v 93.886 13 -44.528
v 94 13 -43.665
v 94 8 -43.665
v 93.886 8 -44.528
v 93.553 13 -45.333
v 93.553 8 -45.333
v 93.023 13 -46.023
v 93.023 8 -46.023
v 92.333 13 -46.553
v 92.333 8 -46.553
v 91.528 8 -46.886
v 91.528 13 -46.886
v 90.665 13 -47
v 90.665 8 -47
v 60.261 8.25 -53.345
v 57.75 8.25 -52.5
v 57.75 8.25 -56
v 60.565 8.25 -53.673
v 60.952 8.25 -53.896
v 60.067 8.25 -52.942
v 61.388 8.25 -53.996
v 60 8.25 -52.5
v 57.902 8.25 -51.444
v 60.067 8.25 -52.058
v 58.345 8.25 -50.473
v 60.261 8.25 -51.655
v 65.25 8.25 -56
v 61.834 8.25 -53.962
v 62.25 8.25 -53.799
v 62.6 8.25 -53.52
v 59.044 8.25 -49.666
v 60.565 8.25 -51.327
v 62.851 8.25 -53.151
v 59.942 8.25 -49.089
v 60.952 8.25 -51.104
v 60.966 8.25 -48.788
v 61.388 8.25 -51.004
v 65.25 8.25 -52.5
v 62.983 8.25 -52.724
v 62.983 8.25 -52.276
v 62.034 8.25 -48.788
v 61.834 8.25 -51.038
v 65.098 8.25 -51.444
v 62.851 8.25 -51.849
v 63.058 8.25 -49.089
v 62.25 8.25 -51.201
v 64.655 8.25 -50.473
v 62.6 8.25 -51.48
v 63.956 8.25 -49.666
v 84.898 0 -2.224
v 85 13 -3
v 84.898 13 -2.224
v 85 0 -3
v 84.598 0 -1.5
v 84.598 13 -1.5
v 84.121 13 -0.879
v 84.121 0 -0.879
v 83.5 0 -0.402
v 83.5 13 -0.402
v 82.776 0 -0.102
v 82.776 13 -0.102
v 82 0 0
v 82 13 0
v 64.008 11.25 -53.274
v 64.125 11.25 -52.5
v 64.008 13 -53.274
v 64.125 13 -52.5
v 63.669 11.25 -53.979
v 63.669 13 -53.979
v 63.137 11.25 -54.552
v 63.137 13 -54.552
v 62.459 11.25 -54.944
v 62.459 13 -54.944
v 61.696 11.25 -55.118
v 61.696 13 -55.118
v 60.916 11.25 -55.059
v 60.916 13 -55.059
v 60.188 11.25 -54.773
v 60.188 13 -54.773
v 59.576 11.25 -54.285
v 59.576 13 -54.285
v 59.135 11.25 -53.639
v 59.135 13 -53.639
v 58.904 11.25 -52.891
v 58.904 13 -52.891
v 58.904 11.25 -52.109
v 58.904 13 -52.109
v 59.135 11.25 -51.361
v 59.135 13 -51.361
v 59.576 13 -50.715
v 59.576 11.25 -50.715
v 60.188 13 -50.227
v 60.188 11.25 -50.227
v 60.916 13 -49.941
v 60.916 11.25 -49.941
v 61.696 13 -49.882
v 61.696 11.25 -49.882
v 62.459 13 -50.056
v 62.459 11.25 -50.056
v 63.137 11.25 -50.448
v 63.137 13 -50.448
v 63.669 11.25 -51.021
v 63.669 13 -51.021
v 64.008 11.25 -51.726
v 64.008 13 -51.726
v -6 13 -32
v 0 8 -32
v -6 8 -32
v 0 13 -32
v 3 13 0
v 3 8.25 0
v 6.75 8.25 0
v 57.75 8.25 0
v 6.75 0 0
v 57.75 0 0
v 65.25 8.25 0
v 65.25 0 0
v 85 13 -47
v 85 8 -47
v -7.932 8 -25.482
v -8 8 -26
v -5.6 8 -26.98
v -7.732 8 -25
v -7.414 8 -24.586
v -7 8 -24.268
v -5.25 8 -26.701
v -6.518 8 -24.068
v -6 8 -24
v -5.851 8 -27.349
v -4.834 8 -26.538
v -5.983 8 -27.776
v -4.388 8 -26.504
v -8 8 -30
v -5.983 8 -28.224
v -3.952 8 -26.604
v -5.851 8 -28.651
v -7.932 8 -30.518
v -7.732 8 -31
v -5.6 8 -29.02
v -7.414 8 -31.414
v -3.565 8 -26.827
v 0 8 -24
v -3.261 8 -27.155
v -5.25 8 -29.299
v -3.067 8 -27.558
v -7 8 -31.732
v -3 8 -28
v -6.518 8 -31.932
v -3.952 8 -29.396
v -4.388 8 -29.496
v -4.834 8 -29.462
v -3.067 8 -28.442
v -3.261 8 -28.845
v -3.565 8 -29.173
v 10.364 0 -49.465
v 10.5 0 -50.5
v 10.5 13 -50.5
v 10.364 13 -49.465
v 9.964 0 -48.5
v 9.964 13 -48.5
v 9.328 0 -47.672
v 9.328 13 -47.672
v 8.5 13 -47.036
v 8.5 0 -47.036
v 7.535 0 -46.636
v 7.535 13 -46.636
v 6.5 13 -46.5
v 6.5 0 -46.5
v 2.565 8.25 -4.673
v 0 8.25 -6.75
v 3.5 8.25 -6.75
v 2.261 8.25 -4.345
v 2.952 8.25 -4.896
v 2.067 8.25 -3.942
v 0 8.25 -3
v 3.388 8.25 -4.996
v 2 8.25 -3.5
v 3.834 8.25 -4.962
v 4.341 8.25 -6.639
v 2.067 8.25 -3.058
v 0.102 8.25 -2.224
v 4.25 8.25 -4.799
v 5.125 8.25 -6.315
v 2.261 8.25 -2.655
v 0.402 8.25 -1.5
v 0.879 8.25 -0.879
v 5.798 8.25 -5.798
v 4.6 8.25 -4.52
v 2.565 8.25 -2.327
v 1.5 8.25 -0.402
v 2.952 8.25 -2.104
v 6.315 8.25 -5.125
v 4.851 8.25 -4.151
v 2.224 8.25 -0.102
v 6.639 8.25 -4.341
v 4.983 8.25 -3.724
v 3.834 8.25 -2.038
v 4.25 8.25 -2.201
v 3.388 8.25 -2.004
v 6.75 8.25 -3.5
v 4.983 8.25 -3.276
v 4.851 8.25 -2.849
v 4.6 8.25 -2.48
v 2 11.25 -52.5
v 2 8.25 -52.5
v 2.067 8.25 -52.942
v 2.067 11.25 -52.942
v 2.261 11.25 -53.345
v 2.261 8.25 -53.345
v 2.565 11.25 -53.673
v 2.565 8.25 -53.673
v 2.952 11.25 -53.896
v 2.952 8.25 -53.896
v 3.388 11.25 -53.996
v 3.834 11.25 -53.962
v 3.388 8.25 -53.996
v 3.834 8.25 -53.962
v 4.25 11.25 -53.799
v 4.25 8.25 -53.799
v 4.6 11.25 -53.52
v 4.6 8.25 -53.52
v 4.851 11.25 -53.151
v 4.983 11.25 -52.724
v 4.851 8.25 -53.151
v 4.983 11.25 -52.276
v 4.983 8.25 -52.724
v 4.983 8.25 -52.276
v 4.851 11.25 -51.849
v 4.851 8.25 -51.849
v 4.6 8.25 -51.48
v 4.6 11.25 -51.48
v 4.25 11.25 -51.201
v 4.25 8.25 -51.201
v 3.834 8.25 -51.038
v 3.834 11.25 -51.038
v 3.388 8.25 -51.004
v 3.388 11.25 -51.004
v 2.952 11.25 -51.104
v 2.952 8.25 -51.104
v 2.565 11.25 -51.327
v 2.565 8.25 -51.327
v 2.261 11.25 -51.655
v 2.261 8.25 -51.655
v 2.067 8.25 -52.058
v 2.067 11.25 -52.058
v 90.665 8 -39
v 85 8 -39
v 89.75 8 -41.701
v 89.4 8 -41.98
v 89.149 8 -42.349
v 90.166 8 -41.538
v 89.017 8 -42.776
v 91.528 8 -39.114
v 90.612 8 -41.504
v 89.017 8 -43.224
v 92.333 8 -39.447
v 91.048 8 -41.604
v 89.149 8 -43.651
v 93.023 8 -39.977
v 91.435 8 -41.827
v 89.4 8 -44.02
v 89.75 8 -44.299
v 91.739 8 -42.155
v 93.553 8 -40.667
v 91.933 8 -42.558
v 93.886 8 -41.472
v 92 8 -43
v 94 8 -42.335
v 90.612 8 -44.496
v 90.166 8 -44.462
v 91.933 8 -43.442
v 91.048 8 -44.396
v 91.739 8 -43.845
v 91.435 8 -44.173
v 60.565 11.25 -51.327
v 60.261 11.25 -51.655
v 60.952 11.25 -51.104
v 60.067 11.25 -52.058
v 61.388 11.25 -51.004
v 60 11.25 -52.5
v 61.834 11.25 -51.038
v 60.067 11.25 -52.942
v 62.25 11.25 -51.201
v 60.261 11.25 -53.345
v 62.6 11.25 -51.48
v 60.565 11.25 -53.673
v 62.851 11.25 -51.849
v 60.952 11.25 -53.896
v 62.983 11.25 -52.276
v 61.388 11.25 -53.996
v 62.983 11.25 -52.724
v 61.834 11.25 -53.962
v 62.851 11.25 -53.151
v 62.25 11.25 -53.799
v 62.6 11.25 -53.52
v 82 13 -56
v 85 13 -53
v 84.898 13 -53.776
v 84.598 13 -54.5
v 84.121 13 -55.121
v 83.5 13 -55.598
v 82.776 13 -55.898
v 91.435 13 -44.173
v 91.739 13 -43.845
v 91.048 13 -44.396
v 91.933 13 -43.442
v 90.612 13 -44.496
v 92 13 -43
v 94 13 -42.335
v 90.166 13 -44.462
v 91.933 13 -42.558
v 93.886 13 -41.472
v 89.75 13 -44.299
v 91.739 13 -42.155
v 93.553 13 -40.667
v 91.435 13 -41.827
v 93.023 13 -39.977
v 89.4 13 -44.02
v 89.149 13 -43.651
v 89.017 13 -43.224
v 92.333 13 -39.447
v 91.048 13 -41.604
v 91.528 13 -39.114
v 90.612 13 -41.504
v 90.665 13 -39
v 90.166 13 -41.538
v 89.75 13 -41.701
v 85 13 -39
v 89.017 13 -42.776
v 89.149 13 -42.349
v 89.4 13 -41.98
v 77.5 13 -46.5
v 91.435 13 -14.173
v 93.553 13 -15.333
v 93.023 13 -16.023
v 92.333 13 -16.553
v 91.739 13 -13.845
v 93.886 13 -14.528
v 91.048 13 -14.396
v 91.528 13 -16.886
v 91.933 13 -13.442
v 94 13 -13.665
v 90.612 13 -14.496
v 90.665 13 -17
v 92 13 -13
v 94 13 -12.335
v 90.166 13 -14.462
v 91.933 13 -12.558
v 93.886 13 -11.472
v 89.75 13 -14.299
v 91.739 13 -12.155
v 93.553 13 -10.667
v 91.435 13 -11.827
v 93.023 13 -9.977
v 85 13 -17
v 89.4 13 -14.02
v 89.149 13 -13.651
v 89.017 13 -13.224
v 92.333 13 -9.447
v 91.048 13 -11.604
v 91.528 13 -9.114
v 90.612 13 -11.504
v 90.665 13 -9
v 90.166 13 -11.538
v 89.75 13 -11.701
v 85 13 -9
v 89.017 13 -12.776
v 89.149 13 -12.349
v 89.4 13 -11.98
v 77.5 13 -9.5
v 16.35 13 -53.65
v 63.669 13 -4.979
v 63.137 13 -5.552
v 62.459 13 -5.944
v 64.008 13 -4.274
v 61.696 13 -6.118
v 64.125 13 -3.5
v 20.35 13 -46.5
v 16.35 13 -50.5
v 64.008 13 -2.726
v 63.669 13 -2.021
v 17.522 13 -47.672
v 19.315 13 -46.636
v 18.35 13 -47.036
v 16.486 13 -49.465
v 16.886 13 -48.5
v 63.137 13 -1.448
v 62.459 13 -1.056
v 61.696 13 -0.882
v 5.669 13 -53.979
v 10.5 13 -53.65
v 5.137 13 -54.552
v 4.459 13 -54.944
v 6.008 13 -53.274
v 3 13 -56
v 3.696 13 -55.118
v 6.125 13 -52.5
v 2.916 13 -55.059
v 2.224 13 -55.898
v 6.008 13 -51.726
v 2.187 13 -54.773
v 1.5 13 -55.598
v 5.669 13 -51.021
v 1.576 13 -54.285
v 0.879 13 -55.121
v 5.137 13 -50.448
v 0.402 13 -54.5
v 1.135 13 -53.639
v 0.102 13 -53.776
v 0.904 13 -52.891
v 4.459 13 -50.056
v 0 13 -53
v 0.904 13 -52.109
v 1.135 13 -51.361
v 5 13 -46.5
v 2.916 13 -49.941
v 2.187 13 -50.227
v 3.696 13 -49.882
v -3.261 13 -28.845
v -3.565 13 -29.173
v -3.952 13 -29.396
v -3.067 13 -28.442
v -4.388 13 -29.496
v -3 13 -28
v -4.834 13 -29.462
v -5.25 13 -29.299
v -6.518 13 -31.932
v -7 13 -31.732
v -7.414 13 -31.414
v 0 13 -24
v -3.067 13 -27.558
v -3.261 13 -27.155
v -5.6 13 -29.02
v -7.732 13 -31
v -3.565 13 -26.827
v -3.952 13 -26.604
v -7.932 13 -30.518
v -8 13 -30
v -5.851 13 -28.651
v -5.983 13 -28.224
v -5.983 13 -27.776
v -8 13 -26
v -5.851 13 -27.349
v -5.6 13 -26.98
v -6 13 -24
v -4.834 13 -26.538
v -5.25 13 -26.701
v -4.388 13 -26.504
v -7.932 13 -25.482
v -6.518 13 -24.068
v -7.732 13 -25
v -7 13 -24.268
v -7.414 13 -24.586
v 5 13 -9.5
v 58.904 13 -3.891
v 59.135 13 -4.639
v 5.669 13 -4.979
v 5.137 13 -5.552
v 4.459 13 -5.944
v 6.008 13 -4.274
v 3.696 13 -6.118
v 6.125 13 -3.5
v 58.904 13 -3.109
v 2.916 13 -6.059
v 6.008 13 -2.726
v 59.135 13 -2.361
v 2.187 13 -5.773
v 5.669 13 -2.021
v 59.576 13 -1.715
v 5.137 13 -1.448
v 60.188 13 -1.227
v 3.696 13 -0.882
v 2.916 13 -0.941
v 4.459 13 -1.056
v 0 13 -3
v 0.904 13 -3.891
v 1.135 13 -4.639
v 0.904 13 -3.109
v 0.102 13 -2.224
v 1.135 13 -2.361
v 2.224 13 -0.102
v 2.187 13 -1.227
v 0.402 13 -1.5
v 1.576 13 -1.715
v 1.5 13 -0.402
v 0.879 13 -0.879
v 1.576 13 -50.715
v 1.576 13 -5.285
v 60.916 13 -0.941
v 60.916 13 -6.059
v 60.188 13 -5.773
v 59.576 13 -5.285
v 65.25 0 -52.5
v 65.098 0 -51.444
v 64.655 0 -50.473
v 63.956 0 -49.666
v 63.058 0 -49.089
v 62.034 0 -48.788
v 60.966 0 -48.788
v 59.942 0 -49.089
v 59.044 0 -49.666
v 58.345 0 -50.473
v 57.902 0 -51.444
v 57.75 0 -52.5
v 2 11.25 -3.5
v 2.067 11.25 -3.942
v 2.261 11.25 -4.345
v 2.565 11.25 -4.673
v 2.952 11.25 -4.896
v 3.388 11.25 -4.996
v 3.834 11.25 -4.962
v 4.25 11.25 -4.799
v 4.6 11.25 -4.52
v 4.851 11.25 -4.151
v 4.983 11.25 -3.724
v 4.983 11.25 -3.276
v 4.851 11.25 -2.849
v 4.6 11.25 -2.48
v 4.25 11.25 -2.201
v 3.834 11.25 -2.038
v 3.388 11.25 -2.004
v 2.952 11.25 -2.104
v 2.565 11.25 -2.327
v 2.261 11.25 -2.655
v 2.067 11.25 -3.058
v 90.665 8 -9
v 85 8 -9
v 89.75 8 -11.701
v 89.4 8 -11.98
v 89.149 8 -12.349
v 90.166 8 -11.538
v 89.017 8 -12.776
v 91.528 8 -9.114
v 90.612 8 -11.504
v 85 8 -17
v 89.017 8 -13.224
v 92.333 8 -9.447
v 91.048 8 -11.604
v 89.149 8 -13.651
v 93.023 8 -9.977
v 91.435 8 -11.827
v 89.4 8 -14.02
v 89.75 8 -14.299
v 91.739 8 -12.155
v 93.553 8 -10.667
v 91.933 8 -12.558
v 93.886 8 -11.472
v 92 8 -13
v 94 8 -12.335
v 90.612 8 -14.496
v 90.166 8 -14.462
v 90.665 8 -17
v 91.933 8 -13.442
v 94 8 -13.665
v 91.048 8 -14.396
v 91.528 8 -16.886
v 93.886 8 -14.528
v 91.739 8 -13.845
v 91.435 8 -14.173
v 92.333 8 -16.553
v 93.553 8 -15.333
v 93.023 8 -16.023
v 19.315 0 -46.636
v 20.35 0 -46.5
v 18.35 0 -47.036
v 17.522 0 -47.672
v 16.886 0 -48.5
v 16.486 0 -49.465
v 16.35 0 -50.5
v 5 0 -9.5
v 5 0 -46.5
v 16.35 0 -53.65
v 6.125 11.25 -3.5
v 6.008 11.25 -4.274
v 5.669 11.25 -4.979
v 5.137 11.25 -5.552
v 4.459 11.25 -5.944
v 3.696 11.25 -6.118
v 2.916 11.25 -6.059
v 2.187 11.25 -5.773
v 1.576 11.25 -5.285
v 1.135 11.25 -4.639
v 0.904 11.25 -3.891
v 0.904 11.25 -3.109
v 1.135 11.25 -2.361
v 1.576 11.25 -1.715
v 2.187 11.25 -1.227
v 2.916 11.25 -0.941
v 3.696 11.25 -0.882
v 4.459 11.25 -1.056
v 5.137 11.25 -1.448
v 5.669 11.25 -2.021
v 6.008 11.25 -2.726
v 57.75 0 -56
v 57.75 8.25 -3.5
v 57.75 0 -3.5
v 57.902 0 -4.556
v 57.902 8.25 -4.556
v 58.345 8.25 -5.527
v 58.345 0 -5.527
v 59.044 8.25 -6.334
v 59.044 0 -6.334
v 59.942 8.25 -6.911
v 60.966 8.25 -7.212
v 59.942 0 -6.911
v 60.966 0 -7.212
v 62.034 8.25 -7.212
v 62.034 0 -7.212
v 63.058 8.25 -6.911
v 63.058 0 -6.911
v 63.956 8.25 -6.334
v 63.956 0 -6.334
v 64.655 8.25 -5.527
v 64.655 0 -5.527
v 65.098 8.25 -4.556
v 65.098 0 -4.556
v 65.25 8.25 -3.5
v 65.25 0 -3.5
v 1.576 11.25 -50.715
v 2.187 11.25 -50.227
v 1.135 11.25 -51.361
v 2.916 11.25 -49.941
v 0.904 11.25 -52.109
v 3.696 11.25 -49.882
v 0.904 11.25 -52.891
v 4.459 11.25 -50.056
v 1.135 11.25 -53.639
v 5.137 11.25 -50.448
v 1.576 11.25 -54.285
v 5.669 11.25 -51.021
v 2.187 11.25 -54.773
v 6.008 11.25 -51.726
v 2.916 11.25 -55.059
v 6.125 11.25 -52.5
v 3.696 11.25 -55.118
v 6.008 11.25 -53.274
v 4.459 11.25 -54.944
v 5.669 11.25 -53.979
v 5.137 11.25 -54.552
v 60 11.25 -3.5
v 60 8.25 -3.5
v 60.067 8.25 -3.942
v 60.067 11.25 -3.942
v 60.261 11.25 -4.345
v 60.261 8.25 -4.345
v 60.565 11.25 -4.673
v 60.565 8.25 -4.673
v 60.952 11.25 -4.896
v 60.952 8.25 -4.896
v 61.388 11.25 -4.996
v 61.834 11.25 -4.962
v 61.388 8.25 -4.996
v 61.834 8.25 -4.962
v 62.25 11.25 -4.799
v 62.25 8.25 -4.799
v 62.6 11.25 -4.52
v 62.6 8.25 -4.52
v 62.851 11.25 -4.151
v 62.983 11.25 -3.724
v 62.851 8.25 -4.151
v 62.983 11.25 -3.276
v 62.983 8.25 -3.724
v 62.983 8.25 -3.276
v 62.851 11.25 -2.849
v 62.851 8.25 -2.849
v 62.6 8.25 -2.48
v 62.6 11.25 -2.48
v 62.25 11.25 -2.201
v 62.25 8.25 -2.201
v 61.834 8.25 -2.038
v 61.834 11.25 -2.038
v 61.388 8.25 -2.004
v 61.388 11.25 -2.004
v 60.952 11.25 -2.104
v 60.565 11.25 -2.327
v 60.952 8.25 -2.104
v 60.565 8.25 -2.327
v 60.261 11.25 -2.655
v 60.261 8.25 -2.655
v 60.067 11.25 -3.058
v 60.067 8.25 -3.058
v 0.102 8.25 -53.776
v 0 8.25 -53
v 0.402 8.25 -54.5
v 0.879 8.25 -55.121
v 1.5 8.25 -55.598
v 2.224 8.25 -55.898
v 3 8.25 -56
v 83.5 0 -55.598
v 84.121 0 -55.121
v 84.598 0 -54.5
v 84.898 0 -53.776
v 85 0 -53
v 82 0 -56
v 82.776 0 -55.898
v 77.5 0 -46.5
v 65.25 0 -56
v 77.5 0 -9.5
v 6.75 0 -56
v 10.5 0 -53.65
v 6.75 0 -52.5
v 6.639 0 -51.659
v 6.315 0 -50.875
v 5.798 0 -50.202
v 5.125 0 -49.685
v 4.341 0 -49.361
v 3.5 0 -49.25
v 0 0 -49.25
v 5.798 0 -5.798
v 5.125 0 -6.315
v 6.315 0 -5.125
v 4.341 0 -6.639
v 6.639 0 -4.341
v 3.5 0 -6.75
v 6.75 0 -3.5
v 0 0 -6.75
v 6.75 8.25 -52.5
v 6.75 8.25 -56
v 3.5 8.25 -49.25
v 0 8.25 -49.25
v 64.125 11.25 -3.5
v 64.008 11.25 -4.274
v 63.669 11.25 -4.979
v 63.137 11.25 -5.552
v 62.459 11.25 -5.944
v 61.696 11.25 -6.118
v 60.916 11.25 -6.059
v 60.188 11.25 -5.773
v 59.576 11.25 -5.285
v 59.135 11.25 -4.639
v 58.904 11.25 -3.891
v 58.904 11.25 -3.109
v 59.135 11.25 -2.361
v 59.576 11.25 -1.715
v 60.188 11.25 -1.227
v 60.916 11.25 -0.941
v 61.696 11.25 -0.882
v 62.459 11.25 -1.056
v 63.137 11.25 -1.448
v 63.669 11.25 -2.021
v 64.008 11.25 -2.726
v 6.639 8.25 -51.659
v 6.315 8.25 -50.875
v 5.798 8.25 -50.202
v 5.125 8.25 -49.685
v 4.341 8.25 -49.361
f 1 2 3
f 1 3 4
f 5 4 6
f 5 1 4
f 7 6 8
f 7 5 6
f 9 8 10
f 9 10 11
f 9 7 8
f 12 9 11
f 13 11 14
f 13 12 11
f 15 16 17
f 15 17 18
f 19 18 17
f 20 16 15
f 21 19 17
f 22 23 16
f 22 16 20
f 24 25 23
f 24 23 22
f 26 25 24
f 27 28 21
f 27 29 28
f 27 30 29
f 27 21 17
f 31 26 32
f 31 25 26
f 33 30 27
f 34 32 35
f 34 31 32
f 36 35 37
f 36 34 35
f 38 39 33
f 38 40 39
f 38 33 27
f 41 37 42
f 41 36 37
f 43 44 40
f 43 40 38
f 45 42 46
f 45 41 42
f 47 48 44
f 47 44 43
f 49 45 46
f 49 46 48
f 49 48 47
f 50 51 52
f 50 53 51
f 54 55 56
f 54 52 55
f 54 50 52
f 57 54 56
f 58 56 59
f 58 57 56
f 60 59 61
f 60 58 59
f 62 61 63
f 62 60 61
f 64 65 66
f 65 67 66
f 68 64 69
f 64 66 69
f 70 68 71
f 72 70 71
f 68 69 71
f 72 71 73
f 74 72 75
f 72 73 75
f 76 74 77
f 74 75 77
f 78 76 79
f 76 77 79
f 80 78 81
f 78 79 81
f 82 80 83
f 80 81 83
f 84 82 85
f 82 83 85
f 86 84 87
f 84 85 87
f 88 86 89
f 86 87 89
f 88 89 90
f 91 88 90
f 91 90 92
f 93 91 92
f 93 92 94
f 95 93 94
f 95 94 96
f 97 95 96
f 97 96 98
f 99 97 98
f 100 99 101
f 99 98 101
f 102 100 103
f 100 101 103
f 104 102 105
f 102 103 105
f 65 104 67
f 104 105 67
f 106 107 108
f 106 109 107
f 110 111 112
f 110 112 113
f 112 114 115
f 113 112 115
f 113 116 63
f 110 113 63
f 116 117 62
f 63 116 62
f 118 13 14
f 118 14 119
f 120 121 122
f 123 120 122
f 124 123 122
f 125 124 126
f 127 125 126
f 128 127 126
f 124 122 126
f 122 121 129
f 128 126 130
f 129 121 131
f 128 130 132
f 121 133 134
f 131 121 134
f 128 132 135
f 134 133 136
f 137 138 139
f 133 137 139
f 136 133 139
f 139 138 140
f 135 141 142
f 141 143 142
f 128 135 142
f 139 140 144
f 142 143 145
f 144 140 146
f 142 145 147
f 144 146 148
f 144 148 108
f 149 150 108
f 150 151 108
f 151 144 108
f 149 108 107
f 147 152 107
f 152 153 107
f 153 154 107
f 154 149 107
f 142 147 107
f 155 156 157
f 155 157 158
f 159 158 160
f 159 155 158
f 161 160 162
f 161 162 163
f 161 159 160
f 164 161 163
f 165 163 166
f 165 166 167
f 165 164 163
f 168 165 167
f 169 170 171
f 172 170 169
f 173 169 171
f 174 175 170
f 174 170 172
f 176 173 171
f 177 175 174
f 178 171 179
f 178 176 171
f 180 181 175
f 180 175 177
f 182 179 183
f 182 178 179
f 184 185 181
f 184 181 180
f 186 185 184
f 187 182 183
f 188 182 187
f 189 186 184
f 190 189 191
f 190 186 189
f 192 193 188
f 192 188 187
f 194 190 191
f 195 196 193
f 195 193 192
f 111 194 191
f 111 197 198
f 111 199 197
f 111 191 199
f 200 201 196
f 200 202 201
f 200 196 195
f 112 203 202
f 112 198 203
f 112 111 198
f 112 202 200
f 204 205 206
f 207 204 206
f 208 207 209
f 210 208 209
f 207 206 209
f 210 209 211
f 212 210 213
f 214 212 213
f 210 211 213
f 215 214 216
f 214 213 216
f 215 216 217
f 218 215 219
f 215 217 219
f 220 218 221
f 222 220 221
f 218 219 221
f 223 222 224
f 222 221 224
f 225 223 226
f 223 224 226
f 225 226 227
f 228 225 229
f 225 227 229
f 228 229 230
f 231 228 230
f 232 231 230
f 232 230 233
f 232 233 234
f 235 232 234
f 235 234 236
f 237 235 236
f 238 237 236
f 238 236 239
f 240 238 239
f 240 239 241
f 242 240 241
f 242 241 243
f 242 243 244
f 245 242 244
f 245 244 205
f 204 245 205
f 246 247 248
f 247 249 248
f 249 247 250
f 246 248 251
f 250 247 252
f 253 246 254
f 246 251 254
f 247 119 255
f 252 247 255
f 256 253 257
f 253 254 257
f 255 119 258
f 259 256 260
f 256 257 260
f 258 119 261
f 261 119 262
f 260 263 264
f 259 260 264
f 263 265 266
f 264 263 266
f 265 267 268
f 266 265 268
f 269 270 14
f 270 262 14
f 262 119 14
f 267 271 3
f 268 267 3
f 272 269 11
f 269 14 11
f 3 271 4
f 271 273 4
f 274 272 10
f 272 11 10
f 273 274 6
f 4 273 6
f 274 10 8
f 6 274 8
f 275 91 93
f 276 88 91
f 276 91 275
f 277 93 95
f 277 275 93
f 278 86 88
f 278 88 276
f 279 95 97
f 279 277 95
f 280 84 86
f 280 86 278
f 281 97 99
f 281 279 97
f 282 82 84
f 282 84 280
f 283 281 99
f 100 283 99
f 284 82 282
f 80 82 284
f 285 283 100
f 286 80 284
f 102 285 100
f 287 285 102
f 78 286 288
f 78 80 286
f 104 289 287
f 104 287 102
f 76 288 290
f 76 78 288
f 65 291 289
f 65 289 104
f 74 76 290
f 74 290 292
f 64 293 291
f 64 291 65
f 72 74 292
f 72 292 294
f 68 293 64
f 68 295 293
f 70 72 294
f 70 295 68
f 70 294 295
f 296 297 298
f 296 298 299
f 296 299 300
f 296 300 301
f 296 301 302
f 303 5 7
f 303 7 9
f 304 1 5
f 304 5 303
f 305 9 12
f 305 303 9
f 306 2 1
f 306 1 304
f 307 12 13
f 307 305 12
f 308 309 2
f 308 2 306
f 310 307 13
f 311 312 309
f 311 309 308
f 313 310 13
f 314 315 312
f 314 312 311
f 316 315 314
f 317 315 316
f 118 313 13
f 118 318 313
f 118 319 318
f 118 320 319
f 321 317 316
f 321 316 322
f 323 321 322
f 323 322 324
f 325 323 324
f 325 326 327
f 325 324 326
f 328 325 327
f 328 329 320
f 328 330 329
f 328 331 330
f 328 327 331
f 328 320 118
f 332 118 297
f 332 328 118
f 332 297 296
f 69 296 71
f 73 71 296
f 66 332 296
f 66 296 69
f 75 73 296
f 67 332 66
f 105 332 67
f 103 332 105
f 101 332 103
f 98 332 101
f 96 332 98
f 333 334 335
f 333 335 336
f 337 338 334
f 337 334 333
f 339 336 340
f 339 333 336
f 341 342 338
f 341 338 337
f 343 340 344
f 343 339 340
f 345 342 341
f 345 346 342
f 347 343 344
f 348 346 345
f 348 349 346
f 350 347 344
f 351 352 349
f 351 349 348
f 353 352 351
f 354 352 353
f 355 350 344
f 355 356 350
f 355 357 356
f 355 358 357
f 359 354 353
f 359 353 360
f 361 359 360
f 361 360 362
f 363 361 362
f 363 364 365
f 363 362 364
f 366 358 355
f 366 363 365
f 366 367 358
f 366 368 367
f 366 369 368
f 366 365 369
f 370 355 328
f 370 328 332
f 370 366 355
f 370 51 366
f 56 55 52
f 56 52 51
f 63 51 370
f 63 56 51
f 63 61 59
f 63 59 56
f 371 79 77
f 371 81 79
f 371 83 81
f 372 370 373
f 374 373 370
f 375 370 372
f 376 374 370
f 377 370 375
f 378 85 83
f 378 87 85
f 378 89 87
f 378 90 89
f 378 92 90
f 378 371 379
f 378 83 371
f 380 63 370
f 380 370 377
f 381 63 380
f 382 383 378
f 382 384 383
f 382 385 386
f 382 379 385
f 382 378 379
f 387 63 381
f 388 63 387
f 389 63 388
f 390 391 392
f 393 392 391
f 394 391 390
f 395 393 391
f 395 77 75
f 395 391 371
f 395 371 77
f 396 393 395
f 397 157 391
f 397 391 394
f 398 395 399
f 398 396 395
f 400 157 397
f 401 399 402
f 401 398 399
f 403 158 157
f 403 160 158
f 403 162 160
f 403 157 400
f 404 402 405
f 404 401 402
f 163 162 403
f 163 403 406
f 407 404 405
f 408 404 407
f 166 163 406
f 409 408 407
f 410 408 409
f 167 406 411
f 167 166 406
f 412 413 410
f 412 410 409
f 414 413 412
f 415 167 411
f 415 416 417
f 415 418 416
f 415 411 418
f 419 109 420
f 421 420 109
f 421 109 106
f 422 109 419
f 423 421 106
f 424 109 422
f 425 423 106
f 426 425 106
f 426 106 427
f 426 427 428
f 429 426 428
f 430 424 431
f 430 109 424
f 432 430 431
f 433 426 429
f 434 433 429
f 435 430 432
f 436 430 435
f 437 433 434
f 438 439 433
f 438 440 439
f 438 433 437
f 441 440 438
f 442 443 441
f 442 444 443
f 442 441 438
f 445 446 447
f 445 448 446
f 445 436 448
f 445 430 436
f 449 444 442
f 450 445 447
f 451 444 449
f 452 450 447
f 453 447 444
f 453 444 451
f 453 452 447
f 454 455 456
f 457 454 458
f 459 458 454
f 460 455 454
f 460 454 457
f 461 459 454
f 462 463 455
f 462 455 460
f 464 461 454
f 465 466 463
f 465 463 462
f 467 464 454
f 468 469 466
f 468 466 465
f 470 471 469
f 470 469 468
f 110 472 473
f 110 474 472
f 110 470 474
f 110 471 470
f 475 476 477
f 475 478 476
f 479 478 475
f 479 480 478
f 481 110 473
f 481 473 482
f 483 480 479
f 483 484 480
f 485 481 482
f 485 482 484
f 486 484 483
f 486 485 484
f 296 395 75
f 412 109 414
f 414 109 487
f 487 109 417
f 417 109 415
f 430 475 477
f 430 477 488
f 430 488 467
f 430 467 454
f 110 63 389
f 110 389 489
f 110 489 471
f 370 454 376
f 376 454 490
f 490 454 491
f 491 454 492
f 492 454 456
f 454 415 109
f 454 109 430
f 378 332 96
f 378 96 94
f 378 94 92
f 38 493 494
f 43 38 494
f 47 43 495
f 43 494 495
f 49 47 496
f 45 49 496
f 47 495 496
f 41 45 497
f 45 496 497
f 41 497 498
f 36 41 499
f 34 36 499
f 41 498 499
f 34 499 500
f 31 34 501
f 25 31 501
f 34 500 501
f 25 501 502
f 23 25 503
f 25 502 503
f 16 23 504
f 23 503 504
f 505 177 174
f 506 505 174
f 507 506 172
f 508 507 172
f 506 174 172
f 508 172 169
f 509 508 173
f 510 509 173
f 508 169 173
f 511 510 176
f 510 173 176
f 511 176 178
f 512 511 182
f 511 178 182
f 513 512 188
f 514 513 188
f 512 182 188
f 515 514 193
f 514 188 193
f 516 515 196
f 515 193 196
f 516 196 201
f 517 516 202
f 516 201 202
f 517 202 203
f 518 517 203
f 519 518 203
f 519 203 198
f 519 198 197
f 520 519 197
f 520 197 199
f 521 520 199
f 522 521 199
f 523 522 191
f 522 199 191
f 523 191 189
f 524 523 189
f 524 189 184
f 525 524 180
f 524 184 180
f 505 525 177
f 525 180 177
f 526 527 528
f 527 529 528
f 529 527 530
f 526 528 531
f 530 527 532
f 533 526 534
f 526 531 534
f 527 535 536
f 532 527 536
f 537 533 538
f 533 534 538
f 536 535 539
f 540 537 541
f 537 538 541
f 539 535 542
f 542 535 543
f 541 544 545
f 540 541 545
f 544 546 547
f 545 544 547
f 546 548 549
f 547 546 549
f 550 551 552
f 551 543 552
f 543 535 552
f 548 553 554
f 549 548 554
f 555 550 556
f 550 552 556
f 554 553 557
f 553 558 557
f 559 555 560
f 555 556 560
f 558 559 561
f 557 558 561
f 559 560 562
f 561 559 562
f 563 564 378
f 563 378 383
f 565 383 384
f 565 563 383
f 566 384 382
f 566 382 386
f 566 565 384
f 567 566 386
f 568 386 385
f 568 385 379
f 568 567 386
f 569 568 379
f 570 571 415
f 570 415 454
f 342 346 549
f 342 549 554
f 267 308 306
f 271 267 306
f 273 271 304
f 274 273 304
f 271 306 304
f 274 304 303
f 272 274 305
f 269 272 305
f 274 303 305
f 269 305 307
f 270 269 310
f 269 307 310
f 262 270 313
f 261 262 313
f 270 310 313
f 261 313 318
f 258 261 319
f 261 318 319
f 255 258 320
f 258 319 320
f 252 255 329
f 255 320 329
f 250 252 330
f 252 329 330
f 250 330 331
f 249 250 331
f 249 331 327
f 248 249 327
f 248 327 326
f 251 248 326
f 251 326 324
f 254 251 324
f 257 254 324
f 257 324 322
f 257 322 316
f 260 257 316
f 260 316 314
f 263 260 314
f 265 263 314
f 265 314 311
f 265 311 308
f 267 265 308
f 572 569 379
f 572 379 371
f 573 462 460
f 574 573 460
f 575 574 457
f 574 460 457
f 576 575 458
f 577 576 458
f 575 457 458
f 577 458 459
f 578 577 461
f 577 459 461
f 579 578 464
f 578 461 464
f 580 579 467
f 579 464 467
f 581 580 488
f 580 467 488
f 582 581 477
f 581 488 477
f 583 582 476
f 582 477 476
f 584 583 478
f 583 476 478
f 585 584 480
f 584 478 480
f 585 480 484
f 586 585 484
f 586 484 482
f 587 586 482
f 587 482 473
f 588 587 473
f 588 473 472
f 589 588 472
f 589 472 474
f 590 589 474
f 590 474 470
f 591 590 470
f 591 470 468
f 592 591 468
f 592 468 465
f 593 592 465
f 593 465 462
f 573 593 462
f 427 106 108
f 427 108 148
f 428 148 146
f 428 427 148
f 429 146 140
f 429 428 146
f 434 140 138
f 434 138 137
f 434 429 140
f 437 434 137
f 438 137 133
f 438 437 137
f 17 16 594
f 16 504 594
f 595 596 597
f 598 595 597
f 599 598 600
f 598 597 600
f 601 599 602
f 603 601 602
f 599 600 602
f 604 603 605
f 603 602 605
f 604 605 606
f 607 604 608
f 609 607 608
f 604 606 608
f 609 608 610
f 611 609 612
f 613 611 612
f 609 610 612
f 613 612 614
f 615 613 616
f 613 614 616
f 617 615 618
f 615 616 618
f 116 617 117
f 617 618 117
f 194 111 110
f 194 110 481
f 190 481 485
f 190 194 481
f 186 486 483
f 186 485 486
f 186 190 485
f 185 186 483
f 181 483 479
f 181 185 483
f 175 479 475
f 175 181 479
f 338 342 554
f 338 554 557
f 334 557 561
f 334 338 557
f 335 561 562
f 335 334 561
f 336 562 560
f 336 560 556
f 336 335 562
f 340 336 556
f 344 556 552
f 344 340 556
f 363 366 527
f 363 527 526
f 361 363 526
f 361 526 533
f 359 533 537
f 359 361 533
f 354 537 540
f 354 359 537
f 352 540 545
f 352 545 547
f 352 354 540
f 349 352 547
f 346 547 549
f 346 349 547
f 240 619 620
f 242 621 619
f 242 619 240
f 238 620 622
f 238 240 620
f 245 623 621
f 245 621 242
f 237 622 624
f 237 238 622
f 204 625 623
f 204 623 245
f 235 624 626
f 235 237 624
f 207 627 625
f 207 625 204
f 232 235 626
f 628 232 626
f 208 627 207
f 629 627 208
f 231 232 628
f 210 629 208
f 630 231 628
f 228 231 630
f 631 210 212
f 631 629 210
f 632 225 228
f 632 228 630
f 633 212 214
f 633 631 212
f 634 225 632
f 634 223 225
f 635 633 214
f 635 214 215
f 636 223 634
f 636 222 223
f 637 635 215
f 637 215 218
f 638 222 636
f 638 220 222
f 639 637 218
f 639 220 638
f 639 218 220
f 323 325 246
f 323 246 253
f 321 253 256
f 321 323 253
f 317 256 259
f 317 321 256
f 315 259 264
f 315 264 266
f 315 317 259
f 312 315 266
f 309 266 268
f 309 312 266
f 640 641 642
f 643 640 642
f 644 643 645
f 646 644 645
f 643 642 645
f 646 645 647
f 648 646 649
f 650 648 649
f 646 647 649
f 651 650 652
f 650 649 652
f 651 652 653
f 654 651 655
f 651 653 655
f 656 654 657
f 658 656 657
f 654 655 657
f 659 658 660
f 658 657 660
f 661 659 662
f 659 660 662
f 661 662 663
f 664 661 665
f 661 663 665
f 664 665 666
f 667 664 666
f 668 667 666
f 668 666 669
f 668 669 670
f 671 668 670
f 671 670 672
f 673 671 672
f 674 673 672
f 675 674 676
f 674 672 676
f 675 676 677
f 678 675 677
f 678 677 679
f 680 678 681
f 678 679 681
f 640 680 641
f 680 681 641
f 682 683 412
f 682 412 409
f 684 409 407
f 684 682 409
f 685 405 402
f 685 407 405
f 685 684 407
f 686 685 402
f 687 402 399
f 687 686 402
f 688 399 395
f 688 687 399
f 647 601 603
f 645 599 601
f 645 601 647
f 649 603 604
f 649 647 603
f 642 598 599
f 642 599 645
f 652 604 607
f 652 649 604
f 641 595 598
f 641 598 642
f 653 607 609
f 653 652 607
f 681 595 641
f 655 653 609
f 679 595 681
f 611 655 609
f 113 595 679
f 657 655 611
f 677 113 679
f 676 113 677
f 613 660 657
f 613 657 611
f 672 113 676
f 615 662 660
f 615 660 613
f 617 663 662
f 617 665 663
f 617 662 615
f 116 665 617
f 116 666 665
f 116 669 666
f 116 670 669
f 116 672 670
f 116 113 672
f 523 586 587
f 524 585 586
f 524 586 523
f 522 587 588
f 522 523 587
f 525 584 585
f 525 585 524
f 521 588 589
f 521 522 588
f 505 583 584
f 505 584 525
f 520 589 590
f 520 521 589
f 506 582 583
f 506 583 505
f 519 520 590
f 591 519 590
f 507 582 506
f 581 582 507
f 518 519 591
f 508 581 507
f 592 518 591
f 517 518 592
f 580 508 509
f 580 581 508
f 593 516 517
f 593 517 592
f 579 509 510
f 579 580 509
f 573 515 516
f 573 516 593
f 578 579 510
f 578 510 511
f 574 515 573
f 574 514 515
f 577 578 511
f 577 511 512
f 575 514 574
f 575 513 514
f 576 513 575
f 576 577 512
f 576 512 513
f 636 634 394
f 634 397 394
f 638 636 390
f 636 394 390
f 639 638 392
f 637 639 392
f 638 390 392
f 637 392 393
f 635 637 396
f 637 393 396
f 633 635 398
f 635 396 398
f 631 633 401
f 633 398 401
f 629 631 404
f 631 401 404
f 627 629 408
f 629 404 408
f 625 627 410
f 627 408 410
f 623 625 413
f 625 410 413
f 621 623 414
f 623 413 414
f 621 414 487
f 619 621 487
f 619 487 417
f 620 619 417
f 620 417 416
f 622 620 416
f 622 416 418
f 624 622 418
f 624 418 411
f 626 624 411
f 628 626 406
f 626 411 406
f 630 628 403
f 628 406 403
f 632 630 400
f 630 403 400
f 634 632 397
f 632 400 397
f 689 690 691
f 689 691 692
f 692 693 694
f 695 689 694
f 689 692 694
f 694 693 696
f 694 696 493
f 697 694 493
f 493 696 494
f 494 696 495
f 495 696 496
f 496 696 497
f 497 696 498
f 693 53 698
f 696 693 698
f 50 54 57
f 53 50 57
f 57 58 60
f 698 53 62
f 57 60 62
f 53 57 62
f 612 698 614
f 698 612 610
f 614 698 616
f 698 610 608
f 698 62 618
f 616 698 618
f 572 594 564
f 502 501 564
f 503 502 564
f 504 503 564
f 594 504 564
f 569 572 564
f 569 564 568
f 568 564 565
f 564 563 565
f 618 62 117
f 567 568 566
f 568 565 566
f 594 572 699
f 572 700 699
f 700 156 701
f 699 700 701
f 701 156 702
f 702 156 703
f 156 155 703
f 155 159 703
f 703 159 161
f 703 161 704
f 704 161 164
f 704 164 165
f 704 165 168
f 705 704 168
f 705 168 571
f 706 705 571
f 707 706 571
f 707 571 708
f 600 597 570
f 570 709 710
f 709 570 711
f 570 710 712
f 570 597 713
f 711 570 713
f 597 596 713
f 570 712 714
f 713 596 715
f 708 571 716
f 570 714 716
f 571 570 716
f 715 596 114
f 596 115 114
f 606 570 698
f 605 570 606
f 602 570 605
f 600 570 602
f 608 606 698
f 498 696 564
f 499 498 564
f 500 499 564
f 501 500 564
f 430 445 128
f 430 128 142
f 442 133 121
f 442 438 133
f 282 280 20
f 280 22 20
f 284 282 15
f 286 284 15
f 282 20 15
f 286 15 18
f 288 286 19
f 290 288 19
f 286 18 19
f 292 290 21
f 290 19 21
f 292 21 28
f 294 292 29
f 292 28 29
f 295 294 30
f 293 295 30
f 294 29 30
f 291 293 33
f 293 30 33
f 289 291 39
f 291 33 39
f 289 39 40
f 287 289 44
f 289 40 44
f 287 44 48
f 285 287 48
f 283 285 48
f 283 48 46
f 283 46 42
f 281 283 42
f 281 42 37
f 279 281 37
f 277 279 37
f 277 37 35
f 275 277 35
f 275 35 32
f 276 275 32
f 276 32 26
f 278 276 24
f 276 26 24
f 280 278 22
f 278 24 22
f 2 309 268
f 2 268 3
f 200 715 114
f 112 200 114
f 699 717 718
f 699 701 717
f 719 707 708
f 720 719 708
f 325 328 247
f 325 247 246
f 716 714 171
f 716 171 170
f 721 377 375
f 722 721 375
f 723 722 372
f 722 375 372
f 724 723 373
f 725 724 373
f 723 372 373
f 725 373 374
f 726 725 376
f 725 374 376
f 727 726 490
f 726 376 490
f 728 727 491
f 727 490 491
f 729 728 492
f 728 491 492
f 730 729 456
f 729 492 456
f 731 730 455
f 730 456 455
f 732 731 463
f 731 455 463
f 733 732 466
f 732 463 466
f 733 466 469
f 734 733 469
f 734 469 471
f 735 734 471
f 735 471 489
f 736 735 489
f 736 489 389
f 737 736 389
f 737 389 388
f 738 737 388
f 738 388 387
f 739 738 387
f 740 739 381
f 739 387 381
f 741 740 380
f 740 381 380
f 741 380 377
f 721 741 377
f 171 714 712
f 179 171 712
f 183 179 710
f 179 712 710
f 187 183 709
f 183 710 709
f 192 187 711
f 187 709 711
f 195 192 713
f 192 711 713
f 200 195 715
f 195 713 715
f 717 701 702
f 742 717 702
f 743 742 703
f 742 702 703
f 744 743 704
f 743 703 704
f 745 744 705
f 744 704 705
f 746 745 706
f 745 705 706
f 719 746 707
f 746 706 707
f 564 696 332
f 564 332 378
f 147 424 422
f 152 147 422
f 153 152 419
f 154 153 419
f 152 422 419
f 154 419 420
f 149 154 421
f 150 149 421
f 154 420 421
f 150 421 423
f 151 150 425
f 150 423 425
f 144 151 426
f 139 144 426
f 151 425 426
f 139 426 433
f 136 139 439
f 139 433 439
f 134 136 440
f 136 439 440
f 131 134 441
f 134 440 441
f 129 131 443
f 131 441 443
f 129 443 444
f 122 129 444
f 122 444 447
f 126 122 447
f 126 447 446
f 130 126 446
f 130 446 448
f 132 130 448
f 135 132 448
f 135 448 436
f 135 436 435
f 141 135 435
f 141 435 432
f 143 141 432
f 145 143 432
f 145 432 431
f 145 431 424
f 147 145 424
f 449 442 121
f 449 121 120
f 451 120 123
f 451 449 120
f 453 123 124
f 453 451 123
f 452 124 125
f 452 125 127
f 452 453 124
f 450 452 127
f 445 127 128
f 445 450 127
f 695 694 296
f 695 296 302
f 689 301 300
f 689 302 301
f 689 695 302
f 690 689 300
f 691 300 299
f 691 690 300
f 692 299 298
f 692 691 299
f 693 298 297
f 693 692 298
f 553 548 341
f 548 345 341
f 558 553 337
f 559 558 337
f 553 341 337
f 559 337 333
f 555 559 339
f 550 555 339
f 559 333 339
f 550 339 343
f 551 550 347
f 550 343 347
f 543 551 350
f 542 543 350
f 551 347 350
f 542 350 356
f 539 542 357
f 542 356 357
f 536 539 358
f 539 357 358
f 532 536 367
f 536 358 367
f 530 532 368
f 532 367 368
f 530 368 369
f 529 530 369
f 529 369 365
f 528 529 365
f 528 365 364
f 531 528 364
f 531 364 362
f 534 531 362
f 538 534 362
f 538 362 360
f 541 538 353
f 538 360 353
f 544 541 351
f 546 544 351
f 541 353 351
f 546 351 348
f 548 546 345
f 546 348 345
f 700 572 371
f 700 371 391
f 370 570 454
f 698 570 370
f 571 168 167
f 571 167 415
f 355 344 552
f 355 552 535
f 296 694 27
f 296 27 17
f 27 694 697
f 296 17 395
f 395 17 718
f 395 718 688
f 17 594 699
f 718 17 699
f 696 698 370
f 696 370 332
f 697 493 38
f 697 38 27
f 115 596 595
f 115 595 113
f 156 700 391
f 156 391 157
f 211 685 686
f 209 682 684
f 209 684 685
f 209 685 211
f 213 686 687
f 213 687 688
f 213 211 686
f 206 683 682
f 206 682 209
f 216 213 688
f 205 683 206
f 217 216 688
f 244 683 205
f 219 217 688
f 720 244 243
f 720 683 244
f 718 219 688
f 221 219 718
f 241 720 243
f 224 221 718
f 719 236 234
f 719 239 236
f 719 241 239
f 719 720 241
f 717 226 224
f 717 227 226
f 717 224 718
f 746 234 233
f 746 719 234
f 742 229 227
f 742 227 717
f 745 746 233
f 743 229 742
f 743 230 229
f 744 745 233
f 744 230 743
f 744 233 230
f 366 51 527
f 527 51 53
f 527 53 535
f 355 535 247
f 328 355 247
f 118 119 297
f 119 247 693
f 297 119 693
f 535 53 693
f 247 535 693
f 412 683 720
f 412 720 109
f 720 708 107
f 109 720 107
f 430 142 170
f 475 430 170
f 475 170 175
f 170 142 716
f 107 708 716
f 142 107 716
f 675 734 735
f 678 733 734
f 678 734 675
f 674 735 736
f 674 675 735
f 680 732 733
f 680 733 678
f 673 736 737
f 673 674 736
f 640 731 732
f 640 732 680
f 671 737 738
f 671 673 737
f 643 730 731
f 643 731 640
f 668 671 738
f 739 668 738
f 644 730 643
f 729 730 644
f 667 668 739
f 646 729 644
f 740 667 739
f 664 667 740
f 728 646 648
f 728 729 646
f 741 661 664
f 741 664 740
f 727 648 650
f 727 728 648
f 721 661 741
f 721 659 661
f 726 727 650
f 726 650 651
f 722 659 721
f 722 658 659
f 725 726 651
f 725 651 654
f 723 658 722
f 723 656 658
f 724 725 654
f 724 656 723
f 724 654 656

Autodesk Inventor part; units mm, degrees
ref_plane "YZ Plane" through (0, 0, 0) normal (1, 0, 0) x (0, 1, 0)
ref_plane "XZ Plane" through (0, 0, 0) normal (0, 1, 0) x (-1, 0, 0)
ref_plane "XY Plane" through (0, 0, 0) normal (0, 0, 1) x (1, 0, 0)
sketch "Sketch1" plane through (0, 0, 0) normal (0, 1, 0) x (-1, 0, 0)
  line L0 (-3, 0) -> (-82, 0)
  line L1 (-85, -3) -> (-85, -53)
  line L2 (-82, -56) -> (-3, -56)
  line L3 (0, -53) -> (0, -3)
  arc A0 (-3, -56) -> (0, -53) centre (-3, -53) ccw
  arc A1 (0, -3) -> (-3, 0) centre (-3, -3) ccw
  arc A2 (-82, 0) -> (-85, -3) centre (-82, -3) ccw
  arc A3 (-85, -53) -> (-82, -56) centre (-82, -53) ccw
  circle A4 centre (-3.5, -52.5) radius 1.5
  circle A5 centre (-3.5, -3.5) radius 1.5
  circle A6 centre (-61.5, -52.5) radius 1.5
  circle A7 centre (-61.5, -3.5) radius 1.5
  point P0 (0, 0)
  point P1 (-85, -56)
  point P2 (-85, 0)
  point P3 (0, -56)
  dimension "d0" = 85
  dimension "d1" = 56
  dimension "d2" = 3
  dimension "d9" = 3
  dimension "d10" = 3
  dimension "d15" = 3
  dimension "d16" = 3
  dimension "d140" = 58
  dimension "d141" = 58
  dimension "d142" = 49
  dimension "d143" = 3.5
extrude "Extrusion1" add sketch "Sketch1" along normal blind 13
sketch "Sketch12" plane through (0, 0, 0) normal (0, -1, 0) x (1, 0, 0)
  line L0 (5, -9.5) -> (77.5, -9.5)
  line L1 (77.5, -9.5) -> (77.5, -46.5)
  line L2 (5, -46.5) -> (5, -9.5)
  line L3 (82, -56) -> (3, -56) projected
  line L4 (85, -3) -> (85, -53) projected
  line L5 (3, 0) -> (82, 0) projected
  line L6 (0, -53) -> (0, -3) projected
  line L7 (16.35, -50.5) -> (16.35, -53.65)
  line L8 (16.35, -53.65) -> (10.5, -53.65)
  line L9 (10.5, -53.65) -> (10.5, -50.5)
  line L10 (77.5, -46.5) -> (20.35, -46.5)
  line L11 (6.5, -46.5) -> (5, -46.5)
  arc A0 (10.5, -50.5) -> (6.5, -46.5) centre (6.5, -50.5) ccw
  arc A1 (20.35, -46.5) -> (16.35, -50.5) centre (20.35, -50.5) ccw
  point P0 (0, 0)
  point P1 (10.5, -46.5)
  point P2 (16.35, -46.5)
  dimension "d153" = 7.5
  dimension "d154" = 9.5
  dimension "d155" = 5
  dimension "d157" = 10.5
  dimension "d158" = 2.35
  dimension "d159" = 5.85
  dimension "d160" = 4
extrude "Extrusion12" cut sketch "Sketch12" against normal up to next
sketch "Sketch14" plane through (0, 13, 0) normal (0, 1, 0) x (1, 0, 0)
  circle A0 centre (3.5, 3.5) radius 1.5 projected
  circle A1 centre (3.5, 3.5) radius 2.625
  circle A2 centre (61.5, 3.5) radius 1.5 projected
  circle A3 centre (61.5, 3.5) radius 2.625
  circle A4 centre (61.5, 52.5) radius 1.5 projected
  circle A5 centre (61.5, 52.5) radius 2.625
  circle A6 centre (3.5, 52.5) radius 1.5 projected
  circle A7 centre (3.5, 52.5) radius 2.625
  point P0 (0, 0)
  dimension "d161" = 5.25
  dimension "d162" = 5.25
  dimension "d163" = 5.25
  dimension "d164" = 5.25
extrude "Extrusion14" cut sketch "Sketch14" against normal blind 1.75 contours A0 | A1 | A2 | A3 | A4 | A5 | A6 | A7
sketch "Sketch15" plane through (0, 0, 0) normal (0, -1, 0) x (1, 0, 0)
  arc A0 (3.5, -6.75) -> (6.75, -3.5) centre (3.5, -3.5) ccw
  arc A1 (57.75, -3.5) -> (65.25, -3.5) centre (61.5, -3.5) ccw
  arc A2 (65.25, -52.5) -> (57.75, -52.5) centre (61.5, -52.5) ccw
  arc A3 (6.75, -52.5) -> (3.5, -49.25) centre (3.5, -52.5) ccw
  line L0 (57.75, -3.5) -> (57.75, 0)
  line L1 (3, 0) -> (82, 0) projected
  line L2 (65.25, -3.5) -> (65.25, 0)
  line L3 (65.25, -52.5) -> (65.25, -56)
  line L4 (82, -56) -> (3, -56) projected
  line L5 (57.75, -52.5) -> (57.75, -56)
  line L6 (6.75, -3.5) -> (6.75, 0)
  line L7 (3.5, -6.75) -> (0, -6.75)
  line L8 (0, -53) -> (0, -3) projected
  line L9 (3.5, -49.25) -> (0, -49.25)
  line L10 (6.75, -52.5) -> (6.75, -56)
  line L11 (65.25, 0) -> (57.75, 0)
  line L12 (65.25, -56) -> (57.75, -56)
  arc A4 (0, -53) -> (3, -56) centre (3, -53) ccw projected
  line L13 (6.75, -56) -> (3, -56)
  line L14 (0, -49.25) -> (0, -53)
  line L15 (0, -6.75) -> (0, -3)
  line L16 (3, 0) -> (6.75, 0)
  arc A5 (3, 0) -> (0, -3) centre (3, -3) ccw projected
  arc A6 (3, 0) -> (0, -3) centre (3, -3) ccw
  arc A7 (0, -53) -> (3, -56) centre (3, -53) ccw
  point P0 (0, 0)
  dimension "d167" = 6.5
  dimension "d168" = 6.5
  dimension "d169" = 7.5
  dimension "d170" = 7.5
extrude "Extrusion15" cut sketch "Sketch15" against normal blind 8.25
sketch "Sketch16" plane through (0, 13, 0) normal (0, 1, 0) x (1, 0, 0)
  line L0 (5, 9.5) -> (5, 46.5) projected
  line L1 (0, 49.25) -> (0, 6.75) projected
  line L2 (0, 32) -> (-6, 32)
  line L3 (-8, 30) -> (-8, 26)
  line L4 (-6, 24) -> (0, 24)
  line L5 (0, 24) -> (0, 32)
  circle A0 centre (-4.5, 28) radius 1.5
  arc A1 (-6, 32) -> (-8, 30) centre (-6, 30) ccw
  arc A2 (-8, 26) -> (-6, 24) centre (-6, 26) ccw
  line L6 (3, 0) -> (82, 0) projected
  line L7 (42.5, 0) -> (42.5, 9.5)
  line L8 (85, 39) -> (90.6651, 39)
  line L9 (94, 42.3349) -> (94, 43.6651)
  line L10 (90.6651, 47) -> (85, 47)
  line L11 (85, 47) -> (85, 39)
  circle A3 centre (90.5, 43) radius 1.5
  arc A4 (90.6651, 39) -> (94, 42.3349) centre (90.6651, 42.3349) ccw
  arc A5 (94, 43.6651) -> (90.6651, 47) centre (90.6651, 43.6651) ccw
  line L12 (85, 3) -> (85, 53) projected
  line L13 (82, 56) -> (3, 56) projected
  line L14 (85, 17) -> (85, 9)
  line L15 (90.6651, 17) -> (85, 17)
  line L16 (85, 9) -> (90.6651, 9)
  circle A6 centre (90.5, 13) radius 1.5
  arc A7 (94, 13.6651) -> (90.6651, 17) centre (90.6651, 13.6651) ccw
  line L17 (94, 12.3349) -> (94, 13.6651)
  arc A8 (90.6651, 9) -> (94, 12.3349) centre (90.6651, 12.3349) ccw
  point P0 (0, 0)
  point P1 (0, 28)
  point P2 (-8, 24)
  point P3 (-8, 32)
  point P4 (94, 47)
  point P5 (94, 39)
  point P6 (85, 28)
  point P7 (94, 17)
  point P8 (94, 9)
  point P9 (0, 24)
  dimension "d175" = 4
  dimension "d176" = 8
  dimension "d177" = 8
  dimension "d178" = 4
  dimension "d179" = 3.5
  dimension "d180" = 2
  dimension "d183" = 8
  dimension "d184" = 9
  dimension "d185" = 4
  dimension "d186" = 3.5
  dimension "d188" = 0
  dimension "d189" = 9
  dimension "d190" = 8
  dimension "d191" = 9
  dimension "d192" = 4
  dimension "d193" = 3.5
  dimension "d194" = 9
  dimension "d197" = 3
  dimension "d198" = 3
  dimension "d199" = 3
  dimension "d200" = 24
extrude "Extrusion16" add sketch "Sketch16" against normal blind 5
equation "\"d10\" = d9"
equation "\"d15\" = d9"
equation "\"d16\" = d9"
equation "\"d162\" = d161"
equation "\"d163\" = d161"
equation "\"d164\" = d161"
equation "\"d175\" = 0.5 * d176"
equation "\"d178\" = d175"
equation "\"d185\" = 0.5 * d183"
equation "\"d192\" = 0.5 * d190"
equation "\"d198\" = d197"
equation "\"d199\" = d197"
equation "\"d182\" = 0.5 * d183"
properties part number "Pi3BatteryBoard_Mockup"
